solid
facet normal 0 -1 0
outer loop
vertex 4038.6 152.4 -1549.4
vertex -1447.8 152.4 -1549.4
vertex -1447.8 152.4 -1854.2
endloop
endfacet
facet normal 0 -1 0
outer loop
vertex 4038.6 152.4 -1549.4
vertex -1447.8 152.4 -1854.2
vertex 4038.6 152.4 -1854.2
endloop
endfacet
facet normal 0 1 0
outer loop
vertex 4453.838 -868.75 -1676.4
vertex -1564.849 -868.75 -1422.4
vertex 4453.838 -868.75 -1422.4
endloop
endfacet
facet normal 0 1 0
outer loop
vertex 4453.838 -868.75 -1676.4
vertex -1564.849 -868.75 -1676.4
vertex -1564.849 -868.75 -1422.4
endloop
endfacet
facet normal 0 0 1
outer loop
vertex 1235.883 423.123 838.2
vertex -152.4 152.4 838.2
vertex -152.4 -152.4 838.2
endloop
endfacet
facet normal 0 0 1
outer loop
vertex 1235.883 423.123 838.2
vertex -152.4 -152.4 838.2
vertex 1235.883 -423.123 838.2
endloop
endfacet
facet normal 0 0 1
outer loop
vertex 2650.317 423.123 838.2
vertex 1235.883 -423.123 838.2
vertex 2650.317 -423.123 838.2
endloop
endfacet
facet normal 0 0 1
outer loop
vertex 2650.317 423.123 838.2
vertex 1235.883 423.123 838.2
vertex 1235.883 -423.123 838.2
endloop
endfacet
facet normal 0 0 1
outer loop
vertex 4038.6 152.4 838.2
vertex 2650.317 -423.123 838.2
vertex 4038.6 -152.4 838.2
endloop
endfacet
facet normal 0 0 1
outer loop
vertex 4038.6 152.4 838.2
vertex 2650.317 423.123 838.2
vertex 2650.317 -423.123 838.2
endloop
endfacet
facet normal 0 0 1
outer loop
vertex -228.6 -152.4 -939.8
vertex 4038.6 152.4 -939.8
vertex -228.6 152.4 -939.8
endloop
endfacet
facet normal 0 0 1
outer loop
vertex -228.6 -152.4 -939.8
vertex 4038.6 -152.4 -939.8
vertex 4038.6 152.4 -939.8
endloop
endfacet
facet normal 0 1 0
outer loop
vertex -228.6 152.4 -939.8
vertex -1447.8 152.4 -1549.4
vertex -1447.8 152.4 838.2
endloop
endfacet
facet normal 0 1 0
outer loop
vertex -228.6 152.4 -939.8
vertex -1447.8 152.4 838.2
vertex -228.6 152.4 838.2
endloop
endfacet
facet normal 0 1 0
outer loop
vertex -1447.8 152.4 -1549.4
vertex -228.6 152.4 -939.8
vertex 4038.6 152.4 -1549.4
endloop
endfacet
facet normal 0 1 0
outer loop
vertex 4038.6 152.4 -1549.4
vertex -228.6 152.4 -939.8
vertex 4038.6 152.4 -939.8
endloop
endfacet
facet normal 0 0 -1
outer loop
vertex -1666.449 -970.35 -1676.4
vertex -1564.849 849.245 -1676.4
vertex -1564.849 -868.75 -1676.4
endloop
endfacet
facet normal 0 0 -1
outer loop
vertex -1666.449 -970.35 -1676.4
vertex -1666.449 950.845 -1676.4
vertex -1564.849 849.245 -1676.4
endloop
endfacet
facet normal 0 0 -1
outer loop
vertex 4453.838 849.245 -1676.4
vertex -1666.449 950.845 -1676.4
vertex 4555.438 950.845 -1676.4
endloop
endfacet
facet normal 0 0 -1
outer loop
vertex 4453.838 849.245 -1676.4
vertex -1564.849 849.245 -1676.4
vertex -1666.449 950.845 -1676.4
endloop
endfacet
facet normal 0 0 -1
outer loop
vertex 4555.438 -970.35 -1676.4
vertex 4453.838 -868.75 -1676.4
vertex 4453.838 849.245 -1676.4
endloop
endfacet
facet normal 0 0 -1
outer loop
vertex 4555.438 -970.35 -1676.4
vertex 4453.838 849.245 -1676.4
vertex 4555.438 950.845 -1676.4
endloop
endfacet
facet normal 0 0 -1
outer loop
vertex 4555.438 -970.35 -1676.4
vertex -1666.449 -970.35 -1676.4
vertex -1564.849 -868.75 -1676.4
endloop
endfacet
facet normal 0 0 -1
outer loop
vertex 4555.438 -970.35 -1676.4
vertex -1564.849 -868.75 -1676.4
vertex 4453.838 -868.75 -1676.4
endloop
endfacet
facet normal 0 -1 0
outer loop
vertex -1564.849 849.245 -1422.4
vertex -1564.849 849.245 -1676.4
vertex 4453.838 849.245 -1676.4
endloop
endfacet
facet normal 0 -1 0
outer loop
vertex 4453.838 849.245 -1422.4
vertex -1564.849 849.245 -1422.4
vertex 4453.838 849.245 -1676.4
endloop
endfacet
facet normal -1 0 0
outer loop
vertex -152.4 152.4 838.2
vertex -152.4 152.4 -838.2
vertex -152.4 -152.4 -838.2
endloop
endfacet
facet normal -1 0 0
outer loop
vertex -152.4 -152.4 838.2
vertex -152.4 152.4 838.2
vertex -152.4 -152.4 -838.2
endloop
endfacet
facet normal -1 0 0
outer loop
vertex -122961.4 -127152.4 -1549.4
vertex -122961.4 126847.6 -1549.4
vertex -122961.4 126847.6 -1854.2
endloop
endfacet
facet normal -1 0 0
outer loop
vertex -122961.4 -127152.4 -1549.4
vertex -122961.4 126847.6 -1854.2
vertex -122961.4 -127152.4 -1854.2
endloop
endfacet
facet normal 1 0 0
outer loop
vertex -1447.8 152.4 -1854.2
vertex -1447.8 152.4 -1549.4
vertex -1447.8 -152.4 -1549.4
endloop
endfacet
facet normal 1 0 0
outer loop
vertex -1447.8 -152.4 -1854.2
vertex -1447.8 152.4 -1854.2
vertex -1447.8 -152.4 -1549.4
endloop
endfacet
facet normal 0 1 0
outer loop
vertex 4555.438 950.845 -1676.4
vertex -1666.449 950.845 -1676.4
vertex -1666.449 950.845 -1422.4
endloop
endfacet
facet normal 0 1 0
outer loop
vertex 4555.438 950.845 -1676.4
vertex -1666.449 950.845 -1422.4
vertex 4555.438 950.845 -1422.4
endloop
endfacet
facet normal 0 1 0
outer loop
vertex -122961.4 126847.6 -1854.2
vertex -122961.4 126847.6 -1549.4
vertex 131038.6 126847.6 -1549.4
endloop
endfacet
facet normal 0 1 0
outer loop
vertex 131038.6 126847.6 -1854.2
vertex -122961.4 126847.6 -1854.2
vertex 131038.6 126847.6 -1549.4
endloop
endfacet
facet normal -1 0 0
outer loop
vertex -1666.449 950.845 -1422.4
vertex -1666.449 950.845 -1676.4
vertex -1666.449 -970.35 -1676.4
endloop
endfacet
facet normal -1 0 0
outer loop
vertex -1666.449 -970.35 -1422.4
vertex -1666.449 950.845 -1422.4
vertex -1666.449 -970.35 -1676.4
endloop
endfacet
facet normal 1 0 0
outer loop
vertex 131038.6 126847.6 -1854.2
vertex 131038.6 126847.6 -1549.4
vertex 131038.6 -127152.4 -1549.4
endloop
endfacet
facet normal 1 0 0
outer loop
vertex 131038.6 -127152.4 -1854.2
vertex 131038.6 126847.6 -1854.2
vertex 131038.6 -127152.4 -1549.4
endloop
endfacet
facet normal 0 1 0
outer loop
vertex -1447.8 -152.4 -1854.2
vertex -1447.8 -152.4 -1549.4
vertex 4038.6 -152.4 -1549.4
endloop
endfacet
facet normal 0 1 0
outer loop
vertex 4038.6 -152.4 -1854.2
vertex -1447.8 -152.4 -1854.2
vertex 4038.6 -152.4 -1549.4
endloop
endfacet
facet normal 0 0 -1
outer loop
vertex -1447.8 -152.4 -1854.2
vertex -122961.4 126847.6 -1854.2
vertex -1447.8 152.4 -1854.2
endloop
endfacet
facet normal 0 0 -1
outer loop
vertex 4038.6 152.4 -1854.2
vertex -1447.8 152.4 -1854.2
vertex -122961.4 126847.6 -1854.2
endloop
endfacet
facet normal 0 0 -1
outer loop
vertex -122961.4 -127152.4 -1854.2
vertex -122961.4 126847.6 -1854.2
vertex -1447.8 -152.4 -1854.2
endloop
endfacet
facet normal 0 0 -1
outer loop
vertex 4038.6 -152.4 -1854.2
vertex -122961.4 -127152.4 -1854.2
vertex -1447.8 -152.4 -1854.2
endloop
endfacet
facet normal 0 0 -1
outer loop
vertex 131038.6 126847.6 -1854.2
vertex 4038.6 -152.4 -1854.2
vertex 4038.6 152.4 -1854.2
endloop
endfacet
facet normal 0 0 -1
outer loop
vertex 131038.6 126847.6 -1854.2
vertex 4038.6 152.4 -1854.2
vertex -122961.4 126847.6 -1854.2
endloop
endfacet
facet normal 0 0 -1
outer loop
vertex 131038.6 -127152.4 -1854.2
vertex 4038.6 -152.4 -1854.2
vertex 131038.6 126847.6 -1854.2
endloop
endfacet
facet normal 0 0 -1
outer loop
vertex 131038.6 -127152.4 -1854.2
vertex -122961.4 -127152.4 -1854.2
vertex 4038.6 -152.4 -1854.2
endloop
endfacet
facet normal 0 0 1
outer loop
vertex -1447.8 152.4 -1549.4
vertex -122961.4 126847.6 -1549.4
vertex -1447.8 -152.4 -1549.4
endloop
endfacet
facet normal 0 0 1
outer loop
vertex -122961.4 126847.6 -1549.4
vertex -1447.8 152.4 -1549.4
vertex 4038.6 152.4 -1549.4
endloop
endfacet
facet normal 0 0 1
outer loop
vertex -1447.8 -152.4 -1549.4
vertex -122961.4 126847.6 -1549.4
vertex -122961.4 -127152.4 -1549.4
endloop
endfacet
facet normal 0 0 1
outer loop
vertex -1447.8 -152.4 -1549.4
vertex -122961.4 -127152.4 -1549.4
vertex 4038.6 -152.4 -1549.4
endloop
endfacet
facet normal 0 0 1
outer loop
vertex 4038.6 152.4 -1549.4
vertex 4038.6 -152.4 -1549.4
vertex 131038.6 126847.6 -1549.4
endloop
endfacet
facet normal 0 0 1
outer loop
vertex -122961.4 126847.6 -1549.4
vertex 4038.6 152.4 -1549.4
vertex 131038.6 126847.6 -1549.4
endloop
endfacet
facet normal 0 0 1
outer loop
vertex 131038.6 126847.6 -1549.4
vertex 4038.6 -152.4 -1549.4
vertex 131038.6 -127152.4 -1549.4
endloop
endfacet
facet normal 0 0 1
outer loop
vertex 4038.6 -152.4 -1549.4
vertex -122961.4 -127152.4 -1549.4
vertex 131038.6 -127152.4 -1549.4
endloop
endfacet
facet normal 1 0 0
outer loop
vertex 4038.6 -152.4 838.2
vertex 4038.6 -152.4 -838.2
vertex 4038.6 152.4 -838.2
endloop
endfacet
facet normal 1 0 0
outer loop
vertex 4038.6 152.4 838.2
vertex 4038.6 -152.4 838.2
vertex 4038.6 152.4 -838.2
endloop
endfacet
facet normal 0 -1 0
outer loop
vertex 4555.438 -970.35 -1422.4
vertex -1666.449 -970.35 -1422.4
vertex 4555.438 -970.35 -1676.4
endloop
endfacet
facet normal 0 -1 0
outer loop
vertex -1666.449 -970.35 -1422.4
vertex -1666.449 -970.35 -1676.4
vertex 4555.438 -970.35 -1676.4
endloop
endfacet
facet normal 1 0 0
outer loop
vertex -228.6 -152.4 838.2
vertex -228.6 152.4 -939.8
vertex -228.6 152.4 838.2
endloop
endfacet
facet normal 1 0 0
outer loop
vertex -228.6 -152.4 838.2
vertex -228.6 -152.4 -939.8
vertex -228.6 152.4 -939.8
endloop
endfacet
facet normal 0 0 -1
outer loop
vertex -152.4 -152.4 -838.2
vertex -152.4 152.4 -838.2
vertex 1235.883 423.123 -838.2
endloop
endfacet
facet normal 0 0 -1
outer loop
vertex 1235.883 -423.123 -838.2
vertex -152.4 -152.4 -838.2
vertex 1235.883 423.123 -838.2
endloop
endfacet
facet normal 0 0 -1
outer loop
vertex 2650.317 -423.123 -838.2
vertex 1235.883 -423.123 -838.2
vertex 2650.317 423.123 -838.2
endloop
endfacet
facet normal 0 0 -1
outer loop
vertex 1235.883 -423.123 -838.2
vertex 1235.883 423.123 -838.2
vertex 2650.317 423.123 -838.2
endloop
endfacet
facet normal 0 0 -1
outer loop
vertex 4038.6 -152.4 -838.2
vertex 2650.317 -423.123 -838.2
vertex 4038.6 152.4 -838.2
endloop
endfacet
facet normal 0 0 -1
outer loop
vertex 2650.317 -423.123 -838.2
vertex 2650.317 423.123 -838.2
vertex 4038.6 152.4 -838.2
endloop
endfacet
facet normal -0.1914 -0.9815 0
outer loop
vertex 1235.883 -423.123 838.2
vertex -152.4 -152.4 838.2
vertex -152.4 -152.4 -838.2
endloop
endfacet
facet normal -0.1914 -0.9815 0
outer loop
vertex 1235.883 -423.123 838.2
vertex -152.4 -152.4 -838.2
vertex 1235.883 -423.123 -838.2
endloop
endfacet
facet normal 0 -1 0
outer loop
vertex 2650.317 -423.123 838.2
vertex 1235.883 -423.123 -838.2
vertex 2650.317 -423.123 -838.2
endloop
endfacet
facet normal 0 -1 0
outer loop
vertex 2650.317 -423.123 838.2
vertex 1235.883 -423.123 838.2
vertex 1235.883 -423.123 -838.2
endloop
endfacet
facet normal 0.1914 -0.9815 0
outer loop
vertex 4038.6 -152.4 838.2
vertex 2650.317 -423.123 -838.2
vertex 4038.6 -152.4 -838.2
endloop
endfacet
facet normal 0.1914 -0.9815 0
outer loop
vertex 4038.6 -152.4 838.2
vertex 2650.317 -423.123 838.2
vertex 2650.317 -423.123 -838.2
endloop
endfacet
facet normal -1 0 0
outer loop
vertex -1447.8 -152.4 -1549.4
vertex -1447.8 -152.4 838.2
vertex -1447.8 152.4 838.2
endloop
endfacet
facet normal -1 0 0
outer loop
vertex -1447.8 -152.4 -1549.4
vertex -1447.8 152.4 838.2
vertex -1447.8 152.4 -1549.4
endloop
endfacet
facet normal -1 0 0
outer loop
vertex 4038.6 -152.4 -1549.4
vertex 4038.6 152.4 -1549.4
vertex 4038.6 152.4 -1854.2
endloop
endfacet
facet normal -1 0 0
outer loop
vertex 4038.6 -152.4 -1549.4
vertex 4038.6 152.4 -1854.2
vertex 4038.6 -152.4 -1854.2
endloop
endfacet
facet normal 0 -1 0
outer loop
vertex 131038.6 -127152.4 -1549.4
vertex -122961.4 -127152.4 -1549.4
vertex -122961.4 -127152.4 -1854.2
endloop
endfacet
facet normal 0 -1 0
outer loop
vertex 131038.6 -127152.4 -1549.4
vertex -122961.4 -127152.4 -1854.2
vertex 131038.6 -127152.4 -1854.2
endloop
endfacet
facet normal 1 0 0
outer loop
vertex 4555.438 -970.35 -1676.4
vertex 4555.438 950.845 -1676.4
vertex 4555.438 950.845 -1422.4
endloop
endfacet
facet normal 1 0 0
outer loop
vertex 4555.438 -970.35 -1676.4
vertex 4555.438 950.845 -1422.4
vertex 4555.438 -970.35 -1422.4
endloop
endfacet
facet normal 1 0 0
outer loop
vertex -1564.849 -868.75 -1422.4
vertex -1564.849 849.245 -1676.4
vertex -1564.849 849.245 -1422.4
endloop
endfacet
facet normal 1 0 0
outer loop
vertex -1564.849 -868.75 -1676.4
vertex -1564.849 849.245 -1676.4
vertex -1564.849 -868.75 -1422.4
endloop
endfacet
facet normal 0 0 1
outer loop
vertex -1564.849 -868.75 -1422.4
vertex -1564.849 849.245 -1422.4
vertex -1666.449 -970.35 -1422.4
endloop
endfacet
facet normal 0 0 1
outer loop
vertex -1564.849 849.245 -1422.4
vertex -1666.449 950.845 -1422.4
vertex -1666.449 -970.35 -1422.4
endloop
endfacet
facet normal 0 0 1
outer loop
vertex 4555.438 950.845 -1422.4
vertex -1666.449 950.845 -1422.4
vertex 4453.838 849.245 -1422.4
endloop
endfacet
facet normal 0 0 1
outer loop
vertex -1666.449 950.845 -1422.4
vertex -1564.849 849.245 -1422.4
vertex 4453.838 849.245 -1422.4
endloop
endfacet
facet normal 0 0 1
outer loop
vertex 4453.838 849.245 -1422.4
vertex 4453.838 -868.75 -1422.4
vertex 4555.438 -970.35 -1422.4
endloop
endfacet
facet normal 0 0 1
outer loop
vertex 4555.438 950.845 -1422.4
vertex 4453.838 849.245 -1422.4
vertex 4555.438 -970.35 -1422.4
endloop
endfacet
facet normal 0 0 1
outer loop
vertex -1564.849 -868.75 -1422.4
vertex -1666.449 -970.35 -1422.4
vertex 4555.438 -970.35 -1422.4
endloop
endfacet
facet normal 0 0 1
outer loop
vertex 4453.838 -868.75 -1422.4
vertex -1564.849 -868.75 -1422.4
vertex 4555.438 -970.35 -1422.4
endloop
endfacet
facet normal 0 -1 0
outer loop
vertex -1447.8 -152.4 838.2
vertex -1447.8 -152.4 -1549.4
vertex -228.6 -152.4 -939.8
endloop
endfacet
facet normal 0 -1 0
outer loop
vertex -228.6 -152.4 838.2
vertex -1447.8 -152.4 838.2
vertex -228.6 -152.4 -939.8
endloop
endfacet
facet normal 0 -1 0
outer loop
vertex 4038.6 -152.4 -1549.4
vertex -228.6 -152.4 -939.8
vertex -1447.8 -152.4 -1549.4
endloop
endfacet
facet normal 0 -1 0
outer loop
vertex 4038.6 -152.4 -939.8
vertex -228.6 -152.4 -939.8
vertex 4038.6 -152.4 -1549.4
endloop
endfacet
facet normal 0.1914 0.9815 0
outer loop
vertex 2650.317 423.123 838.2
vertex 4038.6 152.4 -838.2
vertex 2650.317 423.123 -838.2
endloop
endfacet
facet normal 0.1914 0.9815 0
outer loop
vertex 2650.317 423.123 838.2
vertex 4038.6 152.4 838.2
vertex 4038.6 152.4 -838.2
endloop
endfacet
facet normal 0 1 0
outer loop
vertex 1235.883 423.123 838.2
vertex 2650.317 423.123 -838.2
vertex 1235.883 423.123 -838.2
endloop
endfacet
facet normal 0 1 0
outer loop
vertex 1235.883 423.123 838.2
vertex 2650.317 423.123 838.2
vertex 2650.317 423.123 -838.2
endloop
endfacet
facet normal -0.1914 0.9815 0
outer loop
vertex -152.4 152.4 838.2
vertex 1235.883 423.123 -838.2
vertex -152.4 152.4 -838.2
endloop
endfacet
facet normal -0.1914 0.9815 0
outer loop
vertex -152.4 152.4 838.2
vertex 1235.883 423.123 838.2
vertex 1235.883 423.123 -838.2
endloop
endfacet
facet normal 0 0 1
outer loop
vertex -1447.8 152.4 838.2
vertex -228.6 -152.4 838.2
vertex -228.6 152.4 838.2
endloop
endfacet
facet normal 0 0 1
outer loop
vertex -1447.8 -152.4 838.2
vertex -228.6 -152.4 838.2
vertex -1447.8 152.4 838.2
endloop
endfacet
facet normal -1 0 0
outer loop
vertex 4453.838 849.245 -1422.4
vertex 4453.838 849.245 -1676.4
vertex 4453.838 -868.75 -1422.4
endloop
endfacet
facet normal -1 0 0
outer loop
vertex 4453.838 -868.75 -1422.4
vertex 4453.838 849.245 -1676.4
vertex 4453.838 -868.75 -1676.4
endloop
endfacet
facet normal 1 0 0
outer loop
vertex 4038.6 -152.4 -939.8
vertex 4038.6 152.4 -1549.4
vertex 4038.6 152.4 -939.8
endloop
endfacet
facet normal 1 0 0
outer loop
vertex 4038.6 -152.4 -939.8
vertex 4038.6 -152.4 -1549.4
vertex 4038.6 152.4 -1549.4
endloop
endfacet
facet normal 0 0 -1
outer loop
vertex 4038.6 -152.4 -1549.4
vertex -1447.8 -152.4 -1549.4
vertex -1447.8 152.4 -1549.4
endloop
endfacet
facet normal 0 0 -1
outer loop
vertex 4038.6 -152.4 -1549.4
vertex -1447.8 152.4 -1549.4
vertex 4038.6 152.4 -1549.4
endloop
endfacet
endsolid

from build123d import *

# Parameters (mm, degrees)
F1_DEPTH = 838.2
F3_DEPTH = 152.4
F4_W     = 6221.8872991562
F4_H     = 1921.1952090263
F4_W_2   = 6018.6872991562
F4_H_2   = 1717.9952090263
F5_DEPTH = 127
F6_W     = 254000
F6_H     = 254000
F6_W_2   = 5486.4
F6_H_2   = 304.8
F7_DEPTH = 304.8


# Not quite as in the source:
# - a feature names something its author has since deleted; it is built from what else it names


with BuildPart() as f1:
    # F0 (on Top) → F1 (new body, symmetric)
    with BuildSketch(Plane.XY):
        with BuildLine():
            Line((-152.4, 152.4), (-152.4, 0))
            Line((-152.4, 0), (-152.4, -152.4))
            ThreePointArc((-152.4, -152.4), (1943.1, -457.2), (4038.6, -152.4))
            Line((4038.6, -152.4), (4038.6, 152.4))
            ThreePointArc((4038.6, 152.4), (1943.1, 457.2), (-152.4, 152.4))
        make_face()
    extrude(amount=F1_DEPTH, both=True)


with BuildPart() as f3:
    # F2 (on Front) → F3 (new body, symmetric)
    with BuildSketch(Plane.XZ):
        Polygon((-228.6, -939.8), (-228.6, 0), (-228.6, 838.2), (-1447.8, 838.2), (-1447.8, -1549.4), (4038.6, -1549.4), (4038.6, -939.8), align=None)
    extrude(amount=F3_DEPTH, both=True)


with BuildPart() as f5:
    # F4 (on face) → F5 (new body, symmetric)
    with BuildSketch(Plane(origin=(0, 0, -1549.4), x_dir=(1, 0, 0), z_dir=(0, 0, -1))):
        with Locations((1444.4946988106, 9.7524821758)):
            Rectangle(F4_W, F4_H)
        with Locations((1444.4946988106, 9.7524821758)):
            Rectangle(F4_W_2, F4_H_2, mode=Mode.SUBTRACT)
    extrude(amount=F5_DEPTH, both=True)


with BuildPart() as f7:
    # F6 (on face) → F7 (new body)
    with BuildSketch(Plane(origin=(0, 0, -1549.4), x_dir=(1, 0, 0), z_dir=(0, 0, -1))):
        with Locations((4038.6, 152.4)):
            Rectangle(F6_W, F6_H)
        with Locations((1295.4, 0)):
            Rectangle(F6_W_2, F6_H_2, mode=Mode.SUBTRACT)
    extrude(amount=F7_DEPTH)


solid = Compound([f1.part, f3.part, f5.part, f7.part])
